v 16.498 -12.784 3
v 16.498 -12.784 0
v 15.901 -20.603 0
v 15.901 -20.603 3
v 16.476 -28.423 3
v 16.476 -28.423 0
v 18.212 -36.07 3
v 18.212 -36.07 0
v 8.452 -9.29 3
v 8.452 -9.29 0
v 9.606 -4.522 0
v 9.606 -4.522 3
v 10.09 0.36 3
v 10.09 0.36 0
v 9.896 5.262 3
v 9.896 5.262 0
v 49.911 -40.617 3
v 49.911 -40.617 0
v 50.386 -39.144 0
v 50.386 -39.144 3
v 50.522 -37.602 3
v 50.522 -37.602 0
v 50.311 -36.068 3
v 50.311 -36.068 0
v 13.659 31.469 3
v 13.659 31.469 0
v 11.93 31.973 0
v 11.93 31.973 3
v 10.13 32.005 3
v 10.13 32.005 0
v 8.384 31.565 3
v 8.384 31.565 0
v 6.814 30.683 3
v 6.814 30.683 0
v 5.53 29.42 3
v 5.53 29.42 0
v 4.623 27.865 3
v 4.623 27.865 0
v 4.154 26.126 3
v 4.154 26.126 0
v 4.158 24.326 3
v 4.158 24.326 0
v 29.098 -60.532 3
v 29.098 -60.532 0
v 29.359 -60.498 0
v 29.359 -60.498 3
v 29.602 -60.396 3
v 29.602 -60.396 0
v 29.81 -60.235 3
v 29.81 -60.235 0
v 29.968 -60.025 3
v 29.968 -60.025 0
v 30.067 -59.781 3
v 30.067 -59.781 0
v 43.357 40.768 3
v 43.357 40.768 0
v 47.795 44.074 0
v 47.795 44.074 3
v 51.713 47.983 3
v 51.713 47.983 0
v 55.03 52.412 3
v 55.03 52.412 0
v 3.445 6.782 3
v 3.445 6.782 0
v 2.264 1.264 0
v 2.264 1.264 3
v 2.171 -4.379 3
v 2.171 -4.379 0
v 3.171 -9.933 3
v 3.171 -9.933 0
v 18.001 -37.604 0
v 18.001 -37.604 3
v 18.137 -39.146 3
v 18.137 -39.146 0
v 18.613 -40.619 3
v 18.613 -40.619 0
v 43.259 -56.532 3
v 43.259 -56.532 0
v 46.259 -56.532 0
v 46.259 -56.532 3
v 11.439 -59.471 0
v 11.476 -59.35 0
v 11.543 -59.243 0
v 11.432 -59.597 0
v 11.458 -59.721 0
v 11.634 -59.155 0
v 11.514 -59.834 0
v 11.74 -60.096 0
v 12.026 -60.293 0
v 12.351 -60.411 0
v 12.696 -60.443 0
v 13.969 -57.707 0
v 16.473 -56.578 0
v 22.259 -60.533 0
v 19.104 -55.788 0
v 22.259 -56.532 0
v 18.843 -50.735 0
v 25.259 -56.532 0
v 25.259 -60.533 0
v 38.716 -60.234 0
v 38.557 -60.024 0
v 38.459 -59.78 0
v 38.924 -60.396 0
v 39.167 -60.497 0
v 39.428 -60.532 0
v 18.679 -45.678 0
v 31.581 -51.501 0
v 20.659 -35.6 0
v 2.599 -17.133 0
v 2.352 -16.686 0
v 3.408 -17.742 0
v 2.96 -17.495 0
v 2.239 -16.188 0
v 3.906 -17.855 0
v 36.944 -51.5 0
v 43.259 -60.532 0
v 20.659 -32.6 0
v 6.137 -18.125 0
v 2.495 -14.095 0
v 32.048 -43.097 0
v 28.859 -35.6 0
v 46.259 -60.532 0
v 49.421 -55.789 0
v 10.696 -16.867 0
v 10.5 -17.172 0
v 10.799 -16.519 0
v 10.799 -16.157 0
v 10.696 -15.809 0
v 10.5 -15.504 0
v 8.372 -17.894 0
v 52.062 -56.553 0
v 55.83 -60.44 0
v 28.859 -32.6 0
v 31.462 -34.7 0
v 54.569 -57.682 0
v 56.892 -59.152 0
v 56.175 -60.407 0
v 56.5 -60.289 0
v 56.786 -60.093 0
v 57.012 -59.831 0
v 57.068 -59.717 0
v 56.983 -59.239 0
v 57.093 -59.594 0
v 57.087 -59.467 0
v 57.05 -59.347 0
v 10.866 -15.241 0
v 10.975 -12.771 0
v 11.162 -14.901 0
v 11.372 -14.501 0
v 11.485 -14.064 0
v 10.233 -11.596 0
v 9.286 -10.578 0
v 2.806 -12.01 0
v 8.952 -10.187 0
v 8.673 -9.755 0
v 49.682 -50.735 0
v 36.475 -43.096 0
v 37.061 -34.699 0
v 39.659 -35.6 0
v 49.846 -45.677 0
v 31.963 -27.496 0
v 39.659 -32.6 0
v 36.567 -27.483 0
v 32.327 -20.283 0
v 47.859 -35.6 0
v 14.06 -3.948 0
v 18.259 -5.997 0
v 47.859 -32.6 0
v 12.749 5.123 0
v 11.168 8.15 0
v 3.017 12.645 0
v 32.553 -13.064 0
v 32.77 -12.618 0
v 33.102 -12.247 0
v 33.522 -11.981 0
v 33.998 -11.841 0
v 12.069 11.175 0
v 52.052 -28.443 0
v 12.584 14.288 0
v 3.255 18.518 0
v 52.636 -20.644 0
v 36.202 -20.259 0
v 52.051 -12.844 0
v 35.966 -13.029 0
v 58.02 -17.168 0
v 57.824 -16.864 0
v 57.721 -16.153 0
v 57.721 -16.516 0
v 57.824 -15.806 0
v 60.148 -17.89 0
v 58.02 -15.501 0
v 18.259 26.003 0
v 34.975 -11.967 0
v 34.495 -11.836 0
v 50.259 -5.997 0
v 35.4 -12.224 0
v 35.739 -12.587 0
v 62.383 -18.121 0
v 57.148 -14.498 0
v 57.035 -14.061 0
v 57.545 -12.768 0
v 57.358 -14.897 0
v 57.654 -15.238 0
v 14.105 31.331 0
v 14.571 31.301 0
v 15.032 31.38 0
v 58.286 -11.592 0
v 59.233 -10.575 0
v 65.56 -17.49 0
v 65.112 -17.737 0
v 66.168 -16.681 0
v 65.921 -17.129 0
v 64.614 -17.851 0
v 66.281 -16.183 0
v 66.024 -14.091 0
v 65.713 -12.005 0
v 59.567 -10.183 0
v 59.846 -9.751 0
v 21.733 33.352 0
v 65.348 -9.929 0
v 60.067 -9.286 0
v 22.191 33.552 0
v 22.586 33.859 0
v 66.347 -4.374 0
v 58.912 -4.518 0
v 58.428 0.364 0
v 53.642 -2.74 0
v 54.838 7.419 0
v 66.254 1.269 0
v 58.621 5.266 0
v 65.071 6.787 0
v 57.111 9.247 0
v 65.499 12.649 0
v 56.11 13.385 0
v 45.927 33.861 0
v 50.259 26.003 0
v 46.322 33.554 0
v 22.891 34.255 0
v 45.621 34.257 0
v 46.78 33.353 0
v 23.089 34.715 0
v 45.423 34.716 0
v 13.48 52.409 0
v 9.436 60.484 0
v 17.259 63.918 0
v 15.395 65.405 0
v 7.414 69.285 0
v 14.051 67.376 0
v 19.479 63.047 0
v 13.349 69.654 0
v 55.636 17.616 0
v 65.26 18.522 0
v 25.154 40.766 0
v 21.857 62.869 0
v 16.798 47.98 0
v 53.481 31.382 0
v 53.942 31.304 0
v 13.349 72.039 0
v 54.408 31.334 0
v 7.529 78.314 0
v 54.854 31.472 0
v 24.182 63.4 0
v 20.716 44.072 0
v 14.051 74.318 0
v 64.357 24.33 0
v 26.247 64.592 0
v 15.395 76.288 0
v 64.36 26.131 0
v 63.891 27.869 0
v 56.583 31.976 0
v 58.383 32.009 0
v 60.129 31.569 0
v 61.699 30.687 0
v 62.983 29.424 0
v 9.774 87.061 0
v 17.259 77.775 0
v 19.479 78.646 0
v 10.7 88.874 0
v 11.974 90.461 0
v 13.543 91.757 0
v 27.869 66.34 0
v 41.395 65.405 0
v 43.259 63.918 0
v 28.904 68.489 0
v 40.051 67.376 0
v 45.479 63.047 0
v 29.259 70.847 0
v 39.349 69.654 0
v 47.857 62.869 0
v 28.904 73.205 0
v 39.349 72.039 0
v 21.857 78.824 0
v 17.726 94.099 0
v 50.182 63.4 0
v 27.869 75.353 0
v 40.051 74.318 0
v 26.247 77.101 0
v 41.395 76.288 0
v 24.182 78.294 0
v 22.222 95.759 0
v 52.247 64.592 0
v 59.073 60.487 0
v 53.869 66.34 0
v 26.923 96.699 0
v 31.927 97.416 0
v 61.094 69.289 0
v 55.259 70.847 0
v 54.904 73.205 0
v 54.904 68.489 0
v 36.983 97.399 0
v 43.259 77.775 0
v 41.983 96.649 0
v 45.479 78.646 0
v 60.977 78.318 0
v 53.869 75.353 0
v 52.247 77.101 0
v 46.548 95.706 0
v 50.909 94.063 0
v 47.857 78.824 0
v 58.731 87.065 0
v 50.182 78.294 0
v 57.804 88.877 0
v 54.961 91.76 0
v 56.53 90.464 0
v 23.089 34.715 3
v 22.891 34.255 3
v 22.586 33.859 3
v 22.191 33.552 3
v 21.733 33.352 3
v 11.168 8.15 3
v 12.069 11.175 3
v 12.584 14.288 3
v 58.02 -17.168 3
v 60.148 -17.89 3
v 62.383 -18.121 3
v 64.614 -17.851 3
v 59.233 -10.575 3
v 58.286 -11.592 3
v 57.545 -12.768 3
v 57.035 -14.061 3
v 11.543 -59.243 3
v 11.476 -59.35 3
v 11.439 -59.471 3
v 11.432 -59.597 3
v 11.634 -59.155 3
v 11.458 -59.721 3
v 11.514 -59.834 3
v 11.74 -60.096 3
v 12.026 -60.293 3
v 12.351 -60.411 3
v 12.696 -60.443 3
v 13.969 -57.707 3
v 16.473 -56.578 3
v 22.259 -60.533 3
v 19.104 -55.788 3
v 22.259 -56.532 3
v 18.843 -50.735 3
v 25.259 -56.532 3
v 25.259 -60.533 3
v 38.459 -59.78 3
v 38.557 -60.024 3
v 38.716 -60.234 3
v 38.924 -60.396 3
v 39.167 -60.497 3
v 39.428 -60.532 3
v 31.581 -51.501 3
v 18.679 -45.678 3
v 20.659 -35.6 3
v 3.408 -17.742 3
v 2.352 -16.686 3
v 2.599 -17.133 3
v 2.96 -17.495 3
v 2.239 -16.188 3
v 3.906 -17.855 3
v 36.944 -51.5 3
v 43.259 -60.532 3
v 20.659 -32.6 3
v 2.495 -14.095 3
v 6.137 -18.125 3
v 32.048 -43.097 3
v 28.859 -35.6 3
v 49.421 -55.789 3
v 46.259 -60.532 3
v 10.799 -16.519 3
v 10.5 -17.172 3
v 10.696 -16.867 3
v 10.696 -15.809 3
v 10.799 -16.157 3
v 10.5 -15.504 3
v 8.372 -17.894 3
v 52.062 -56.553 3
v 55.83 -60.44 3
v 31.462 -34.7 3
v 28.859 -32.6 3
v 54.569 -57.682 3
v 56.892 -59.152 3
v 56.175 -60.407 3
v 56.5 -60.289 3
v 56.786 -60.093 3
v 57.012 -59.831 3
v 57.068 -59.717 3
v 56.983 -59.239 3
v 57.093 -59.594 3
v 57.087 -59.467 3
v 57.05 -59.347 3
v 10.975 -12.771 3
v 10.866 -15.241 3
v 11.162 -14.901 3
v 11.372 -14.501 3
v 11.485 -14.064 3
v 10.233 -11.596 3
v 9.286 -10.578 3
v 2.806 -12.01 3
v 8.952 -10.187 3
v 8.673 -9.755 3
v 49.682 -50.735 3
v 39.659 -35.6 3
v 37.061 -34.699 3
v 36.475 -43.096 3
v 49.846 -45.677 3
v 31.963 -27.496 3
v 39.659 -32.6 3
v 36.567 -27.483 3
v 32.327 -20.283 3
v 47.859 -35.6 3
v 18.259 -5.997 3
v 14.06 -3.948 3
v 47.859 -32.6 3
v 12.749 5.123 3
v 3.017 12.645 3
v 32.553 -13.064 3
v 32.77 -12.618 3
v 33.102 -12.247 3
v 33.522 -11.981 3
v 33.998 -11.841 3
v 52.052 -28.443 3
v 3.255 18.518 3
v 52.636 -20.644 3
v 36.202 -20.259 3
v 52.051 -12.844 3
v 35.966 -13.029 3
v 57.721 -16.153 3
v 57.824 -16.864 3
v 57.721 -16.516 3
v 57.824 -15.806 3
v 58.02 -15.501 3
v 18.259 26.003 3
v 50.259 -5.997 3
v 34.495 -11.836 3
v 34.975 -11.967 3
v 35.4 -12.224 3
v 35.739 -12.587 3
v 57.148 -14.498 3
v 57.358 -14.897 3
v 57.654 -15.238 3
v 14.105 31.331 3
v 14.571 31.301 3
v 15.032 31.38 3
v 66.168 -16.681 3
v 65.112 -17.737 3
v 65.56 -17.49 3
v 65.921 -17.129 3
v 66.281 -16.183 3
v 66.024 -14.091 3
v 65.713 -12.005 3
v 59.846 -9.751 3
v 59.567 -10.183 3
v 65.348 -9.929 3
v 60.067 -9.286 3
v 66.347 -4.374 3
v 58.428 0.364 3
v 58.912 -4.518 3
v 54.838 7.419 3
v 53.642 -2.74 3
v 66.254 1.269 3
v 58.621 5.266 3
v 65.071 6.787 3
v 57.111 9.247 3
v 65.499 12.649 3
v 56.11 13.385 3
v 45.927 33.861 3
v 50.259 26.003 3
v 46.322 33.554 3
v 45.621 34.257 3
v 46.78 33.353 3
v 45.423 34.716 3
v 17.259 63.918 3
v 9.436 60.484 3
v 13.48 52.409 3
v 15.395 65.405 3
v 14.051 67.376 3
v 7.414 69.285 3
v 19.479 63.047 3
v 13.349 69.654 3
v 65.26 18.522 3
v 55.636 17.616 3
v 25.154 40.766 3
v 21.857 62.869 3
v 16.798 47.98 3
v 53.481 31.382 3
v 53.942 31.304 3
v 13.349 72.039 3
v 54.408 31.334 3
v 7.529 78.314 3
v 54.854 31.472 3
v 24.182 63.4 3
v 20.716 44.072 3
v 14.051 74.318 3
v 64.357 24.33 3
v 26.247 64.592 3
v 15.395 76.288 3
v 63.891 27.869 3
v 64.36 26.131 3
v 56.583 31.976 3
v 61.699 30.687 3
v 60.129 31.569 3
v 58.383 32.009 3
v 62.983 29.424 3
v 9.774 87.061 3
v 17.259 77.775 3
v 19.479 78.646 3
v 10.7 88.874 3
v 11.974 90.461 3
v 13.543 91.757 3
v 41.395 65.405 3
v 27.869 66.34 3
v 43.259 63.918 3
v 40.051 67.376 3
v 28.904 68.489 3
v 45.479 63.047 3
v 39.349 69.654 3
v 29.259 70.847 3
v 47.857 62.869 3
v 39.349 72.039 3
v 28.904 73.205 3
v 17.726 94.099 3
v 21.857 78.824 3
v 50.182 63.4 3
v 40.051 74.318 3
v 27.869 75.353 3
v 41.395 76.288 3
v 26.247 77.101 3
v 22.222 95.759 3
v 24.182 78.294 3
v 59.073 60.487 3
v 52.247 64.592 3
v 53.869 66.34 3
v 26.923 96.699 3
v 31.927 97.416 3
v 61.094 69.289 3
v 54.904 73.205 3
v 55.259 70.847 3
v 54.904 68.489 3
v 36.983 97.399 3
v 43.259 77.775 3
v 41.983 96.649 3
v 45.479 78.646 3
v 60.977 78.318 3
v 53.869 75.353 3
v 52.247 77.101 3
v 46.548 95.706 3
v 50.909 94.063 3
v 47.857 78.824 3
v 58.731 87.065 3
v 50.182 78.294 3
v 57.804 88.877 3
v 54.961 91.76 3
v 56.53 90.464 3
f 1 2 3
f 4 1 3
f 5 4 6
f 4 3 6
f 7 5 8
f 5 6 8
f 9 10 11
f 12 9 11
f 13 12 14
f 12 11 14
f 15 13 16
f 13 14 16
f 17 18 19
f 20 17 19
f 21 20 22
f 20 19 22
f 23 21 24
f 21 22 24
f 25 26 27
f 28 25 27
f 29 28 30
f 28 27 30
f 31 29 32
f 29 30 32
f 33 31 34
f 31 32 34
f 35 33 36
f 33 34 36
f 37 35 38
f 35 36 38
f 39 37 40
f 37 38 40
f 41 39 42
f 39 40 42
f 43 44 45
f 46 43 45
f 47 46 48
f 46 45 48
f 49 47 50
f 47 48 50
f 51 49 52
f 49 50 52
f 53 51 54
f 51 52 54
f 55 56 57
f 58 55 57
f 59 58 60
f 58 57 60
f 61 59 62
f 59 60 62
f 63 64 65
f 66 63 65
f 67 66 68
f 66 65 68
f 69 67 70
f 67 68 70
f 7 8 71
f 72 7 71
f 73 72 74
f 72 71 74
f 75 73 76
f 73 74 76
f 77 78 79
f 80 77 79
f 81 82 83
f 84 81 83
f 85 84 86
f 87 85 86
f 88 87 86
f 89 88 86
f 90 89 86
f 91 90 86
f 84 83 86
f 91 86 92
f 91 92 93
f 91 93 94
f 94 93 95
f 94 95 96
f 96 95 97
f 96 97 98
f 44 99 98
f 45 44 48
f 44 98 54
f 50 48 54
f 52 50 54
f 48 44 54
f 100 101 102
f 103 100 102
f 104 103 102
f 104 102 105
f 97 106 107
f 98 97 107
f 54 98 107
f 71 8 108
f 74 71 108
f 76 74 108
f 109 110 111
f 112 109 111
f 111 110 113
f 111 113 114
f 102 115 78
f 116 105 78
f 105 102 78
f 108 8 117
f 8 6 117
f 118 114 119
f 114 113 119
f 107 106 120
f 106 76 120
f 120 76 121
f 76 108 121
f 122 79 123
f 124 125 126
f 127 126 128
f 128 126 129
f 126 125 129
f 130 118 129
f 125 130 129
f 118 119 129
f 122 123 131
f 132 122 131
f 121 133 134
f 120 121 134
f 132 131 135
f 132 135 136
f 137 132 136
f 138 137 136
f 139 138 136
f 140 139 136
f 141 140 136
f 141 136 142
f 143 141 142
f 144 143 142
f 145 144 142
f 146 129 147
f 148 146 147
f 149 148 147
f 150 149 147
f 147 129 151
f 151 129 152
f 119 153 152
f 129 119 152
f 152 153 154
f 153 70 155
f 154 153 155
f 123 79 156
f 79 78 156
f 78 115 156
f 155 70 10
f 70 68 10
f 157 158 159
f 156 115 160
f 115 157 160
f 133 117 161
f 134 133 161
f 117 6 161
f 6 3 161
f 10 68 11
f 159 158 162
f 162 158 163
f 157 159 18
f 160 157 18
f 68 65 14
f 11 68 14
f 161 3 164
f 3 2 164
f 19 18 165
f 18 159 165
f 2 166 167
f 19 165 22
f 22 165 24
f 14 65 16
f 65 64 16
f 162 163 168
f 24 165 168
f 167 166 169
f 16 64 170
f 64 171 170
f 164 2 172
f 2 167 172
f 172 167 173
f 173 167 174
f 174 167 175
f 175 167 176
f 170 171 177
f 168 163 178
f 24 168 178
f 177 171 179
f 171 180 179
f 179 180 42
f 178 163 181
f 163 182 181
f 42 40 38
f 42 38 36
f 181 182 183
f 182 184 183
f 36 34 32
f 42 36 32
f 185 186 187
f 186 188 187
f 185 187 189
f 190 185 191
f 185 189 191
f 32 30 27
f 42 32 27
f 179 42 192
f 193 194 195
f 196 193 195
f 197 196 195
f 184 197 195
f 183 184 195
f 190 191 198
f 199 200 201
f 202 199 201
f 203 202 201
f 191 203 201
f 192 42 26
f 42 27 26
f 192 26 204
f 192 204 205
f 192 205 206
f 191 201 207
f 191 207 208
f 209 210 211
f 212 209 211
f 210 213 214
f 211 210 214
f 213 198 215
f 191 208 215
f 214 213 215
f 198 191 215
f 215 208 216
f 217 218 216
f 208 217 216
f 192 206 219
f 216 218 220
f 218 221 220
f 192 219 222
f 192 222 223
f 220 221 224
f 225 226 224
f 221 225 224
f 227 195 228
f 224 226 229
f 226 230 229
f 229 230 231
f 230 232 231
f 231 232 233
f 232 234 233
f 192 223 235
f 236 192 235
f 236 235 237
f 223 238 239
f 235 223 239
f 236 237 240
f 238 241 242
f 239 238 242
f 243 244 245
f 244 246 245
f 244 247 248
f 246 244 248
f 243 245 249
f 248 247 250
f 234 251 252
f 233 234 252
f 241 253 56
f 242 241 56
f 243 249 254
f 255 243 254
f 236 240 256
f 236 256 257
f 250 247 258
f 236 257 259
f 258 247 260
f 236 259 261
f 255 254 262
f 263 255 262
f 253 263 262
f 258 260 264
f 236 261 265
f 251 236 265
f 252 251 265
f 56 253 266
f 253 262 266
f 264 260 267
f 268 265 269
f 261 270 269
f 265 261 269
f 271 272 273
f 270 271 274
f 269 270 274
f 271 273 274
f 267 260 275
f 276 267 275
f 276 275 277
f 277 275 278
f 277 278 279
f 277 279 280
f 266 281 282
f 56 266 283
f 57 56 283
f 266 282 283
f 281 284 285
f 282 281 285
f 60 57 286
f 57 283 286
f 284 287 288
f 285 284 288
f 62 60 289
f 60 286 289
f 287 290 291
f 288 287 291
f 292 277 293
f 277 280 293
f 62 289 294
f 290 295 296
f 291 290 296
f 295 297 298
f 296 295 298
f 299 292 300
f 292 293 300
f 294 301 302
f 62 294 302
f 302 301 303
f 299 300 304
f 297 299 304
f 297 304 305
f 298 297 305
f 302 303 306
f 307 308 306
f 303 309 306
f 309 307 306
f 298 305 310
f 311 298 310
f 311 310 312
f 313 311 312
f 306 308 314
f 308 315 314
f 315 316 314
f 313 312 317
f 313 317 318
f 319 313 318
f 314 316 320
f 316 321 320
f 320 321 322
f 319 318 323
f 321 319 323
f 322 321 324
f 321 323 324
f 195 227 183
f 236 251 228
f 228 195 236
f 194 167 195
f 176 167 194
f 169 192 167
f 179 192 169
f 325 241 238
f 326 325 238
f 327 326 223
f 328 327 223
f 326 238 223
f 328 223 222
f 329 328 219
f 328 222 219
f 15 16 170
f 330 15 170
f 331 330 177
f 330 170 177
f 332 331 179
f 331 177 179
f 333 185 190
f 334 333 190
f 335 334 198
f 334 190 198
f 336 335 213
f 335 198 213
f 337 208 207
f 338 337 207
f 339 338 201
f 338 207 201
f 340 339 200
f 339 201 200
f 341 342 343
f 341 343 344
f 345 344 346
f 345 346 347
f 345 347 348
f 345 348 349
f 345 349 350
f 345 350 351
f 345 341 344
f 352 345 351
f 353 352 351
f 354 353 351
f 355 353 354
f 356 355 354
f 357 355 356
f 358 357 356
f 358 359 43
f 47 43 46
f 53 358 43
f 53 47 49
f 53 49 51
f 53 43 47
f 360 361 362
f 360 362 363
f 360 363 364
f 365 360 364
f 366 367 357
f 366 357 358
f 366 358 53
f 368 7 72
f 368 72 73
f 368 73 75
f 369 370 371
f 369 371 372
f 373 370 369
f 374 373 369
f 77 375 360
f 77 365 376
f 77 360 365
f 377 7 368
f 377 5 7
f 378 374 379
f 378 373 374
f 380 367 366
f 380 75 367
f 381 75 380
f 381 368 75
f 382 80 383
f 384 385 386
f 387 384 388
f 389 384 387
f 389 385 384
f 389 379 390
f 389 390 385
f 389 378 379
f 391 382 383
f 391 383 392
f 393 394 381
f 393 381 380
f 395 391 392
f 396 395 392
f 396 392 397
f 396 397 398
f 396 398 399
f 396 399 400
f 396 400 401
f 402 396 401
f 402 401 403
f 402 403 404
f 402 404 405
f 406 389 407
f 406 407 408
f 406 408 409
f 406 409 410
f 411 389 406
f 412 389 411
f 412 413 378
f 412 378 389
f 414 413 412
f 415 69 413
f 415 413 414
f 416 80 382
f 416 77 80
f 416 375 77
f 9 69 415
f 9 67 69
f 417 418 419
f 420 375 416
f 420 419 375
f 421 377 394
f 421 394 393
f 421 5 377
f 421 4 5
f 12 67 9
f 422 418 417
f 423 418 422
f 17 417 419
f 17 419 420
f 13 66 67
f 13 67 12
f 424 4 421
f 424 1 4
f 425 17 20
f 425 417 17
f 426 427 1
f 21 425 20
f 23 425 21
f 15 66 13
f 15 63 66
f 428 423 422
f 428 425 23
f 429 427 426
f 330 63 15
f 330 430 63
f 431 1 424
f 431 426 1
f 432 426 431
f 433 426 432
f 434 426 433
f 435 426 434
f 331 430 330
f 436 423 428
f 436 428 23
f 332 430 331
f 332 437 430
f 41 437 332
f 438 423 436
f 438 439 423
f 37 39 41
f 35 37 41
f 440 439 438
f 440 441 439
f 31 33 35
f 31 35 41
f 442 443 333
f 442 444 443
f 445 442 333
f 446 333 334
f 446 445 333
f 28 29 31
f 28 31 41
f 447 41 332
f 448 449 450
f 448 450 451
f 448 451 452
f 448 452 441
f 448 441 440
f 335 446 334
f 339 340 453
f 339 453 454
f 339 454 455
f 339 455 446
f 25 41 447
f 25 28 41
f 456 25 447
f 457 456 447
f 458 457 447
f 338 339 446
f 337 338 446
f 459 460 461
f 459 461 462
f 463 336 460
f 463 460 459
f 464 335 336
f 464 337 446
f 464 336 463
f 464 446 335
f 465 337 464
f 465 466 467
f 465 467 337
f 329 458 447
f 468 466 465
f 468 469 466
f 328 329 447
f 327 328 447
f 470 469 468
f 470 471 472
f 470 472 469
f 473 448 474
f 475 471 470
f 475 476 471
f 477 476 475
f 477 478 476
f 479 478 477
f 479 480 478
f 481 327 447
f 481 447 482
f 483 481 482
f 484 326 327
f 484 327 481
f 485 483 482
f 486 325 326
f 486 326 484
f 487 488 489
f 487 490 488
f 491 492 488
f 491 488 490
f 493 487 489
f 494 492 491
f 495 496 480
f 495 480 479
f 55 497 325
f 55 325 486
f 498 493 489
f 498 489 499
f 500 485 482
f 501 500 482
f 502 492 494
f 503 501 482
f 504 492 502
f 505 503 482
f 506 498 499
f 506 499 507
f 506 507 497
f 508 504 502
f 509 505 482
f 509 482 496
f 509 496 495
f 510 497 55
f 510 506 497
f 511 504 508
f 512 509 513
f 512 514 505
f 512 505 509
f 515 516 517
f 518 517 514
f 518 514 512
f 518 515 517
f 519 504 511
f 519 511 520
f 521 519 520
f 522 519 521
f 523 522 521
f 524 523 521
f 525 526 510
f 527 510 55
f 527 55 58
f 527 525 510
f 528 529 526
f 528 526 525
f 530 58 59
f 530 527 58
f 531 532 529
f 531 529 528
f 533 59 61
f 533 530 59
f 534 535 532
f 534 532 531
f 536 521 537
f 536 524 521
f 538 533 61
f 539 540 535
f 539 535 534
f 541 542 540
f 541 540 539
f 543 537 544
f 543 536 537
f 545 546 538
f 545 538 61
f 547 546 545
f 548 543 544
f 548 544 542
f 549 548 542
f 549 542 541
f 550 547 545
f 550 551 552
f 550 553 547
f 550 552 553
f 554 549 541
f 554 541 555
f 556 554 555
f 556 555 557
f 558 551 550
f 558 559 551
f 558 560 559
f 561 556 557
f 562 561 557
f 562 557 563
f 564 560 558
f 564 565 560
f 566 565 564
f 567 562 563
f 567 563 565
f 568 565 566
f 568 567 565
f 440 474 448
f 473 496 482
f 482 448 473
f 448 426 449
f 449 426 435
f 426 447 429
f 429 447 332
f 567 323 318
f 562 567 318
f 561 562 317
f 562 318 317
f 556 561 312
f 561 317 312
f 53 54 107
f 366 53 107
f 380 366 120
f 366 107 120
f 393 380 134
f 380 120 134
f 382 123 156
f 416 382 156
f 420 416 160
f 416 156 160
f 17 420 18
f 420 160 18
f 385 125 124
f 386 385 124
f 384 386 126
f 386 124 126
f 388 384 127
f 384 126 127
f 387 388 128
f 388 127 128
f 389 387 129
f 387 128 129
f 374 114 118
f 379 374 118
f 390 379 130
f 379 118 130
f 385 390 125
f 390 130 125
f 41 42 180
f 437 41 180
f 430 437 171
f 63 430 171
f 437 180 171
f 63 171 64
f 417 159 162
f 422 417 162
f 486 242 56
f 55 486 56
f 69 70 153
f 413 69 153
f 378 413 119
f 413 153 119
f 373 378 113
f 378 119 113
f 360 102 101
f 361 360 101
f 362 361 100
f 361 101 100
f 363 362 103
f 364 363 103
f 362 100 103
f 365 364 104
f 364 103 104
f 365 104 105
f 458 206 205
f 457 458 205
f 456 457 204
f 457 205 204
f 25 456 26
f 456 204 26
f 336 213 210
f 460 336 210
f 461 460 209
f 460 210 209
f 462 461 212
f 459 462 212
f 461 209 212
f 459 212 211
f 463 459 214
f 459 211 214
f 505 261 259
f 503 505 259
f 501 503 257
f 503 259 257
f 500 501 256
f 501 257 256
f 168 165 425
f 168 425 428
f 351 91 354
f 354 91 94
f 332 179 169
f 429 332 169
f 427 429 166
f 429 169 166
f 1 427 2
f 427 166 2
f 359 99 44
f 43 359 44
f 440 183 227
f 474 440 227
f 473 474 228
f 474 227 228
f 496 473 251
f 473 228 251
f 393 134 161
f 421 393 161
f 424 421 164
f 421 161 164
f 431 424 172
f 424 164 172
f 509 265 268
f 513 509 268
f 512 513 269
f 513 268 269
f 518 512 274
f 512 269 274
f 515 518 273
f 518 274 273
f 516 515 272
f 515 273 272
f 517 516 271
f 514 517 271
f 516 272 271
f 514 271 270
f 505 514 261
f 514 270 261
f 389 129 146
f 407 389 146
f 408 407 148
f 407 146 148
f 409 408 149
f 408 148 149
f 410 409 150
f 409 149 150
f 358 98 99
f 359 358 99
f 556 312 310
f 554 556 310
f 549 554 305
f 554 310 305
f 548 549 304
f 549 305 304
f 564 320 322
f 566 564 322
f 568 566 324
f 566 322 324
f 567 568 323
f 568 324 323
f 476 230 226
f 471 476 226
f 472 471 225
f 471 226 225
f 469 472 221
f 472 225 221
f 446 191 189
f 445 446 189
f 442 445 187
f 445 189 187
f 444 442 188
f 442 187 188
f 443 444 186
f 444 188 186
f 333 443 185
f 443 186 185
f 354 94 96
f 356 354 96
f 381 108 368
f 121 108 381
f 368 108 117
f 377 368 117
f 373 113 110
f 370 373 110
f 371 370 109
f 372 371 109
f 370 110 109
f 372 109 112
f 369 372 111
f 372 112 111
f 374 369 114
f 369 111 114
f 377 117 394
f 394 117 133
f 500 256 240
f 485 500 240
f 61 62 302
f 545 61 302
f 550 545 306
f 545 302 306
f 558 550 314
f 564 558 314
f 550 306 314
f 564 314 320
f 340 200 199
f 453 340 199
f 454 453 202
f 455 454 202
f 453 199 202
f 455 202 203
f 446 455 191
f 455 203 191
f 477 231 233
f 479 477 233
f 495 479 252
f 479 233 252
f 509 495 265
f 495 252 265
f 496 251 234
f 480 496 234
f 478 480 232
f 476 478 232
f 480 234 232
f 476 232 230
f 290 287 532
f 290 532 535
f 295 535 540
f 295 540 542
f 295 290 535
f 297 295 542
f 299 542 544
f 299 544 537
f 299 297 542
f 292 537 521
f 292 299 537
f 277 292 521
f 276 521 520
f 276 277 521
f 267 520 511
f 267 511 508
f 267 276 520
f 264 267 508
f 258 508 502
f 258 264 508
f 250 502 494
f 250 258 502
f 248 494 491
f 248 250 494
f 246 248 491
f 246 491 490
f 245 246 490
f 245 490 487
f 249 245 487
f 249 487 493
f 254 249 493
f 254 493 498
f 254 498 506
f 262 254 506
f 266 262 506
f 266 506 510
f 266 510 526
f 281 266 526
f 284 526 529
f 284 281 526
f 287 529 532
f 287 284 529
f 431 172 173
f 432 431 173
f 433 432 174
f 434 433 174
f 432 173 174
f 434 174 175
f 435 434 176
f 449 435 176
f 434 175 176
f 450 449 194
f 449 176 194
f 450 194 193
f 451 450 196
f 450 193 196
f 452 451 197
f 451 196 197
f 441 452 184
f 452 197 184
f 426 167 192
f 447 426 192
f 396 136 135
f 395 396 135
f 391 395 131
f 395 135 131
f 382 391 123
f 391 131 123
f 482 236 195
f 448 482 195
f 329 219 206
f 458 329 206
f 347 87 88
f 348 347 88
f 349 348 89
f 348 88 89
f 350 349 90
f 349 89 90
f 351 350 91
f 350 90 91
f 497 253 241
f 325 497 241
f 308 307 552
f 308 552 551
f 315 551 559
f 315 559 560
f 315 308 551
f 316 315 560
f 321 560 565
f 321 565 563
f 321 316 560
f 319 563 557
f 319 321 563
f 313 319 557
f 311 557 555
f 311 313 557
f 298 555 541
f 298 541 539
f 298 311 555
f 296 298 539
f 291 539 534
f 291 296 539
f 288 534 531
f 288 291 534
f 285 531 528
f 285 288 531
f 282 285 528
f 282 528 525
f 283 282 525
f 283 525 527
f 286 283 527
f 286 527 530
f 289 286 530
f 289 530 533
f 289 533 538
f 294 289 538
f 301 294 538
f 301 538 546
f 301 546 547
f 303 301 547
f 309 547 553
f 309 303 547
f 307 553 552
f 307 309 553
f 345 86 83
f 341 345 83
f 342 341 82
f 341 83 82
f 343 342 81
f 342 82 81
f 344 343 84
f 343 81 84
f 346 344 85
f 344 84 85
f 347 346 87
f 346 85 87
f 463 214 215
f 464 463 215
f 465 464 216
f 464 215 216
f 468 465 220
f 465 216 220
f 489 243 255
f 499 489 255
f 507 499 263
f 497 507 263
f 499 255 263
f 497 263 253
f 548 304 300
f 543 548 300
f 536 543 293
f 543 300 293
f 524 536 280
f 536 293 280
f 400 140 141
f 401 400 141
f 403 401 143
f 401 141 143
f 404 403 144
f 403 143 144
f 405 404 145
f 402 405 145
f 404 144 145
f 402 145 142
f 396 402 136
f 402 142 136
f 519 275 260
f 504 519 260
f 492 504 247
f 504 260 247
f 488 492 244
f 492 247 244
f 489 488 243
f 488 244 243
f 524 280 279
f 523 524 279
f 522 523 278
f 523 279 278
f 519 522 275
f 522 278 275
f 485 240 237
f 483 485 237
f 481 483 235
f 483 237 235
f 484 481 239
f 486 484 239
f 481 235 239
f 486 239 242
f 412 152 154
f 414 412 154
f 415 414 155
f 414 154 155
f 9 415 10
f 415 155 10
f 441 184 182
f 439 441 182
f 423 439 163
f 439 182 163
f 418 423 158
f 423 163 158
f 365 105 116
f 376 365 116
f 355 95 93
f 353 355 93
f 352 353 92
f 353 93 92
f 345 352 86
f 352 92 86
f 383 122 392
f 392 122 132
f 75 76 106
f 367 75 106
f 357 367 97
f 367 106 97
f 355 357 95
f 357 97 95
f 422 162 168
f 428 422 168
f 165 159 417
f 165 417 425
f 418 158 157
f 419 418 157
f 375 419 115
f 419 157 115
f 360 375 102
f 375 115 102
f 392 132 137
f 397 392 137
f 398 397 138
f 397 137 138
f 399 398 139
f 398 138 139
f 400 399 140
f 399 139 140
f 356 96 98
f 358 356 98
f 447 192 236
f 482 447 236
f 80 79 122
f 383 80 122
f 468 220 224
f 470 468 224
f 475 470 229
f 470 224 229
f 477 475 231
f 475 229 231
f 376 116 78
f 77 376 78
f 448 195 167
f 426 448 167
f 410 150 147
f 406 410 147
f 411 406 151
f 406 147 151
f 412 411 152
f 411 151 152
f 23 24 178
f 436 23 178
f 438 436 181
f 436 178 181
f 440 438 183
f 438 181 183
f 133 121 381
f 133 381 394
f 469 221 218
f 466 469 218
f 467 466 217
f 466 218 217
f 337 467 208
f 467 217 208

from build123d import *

# Parameters (mm, degrees)
MODEL_R                 = 8
MODEL_W                 = 8.2
MODEL_H                 = 3
SALIENTE_EXTRUIR1_DEPTH = 3


with BuildPart() as part:
    # Model → Saliente-Extruir1 (new body)
    with BuildSketch(Plane.XY):
        with BuildLine():
            Line((53.481445034, 31.38247243), (46.779993349, 33.353487631))
            ThreePointArc((46.779993349, 33.353487631), (45.927013388, 33.861110925), (45.423137443, 34.716309882))
            Line((45.423137443, 34.716309882), (43.357228049, 40.767605918))
            ThreePointArc((43.357228049, 40.767605918), (49.8242529, 45.957956881), (55.030233707, 52.412406306))
            ThreePointArc((55.030233707, 52.412406306), (61.093598066, 69.288732485), (58.730938319, 87.064913502))
            ThreePointArc((58.730938319, 87.064913502), (57.207808393, 89.703172008), (54.961022773, 91.760424326))
            ThreePointArc((54.961022773, 91.760424326), (48.760554591, 94.970135555), (41.983416035, 96.648958014))
            ThreePointArc((41.983416035, 96.648958014), (34.455707931, 97.499868783), (26.92255254, 96.698614587))
            ThreePointArc((26.92255254, 96.698614587), (19.94147438, 95.017139449), (13.543281779, 91.757393696))
            ThreePointArc((13.543281779, 91.757393696), (11.296797252, 89.699812596), (9.774053436, 87.061331216))
            ThreePointArc((9.774053436, 87.061331216), (7.413995161, 69.284804627), (13.479829214, 52.409365969))
            ThreePointArc((13.479829214, 52.409365969), (18.686734846, 45.955698119), (25.154492019, 40.766303923))
            Line((25.154492019, 40.766303923), (23.089449249, 34.714697754))
            ThreePointArc((23.089449249, 34.714697754), (22.585696773, 33.859426062), (21.732790104, 33.351679631))
            Line((21.732790104, 33.351679631), (15.03162304, 31.379696979))
            ThreePointArc((15.03162304, 31.379696979), (14.337279285, 31.302558661), (13.658765154, 31.468938177))
            ThreePointArc((13.658765154, 31.468938177), (6.813868189, 30.682998994), (4.157550352, 24.325775512))
            ThreePointArc((4.157550352, 24.325775512), (3.052384752, 15.584544005), (3.445376772, 6.78249444))
            ThreePointArc((3.445376772, 6.78249444), (2.079974129, -1.555345588), (3.171410736, -9.933451987))
            ThreePointArc((3.171410736, -9.933451987), (2.64421566, -13.051552622), (2.238579914, -16.187783777))
            ThreePointArc((2.238579914, -16.187783777), (2.76704769, -17.326785827), (3.90620228, -17.854924712))
            ThreePointArc((3.90620228, -17.854924712), (7.260899106, -18.072090773), (10.49984033, -17.171862116))
            ThreePointArc((10.49984033, -17.171862116), (10.811965124, -16.338126213), (10.499599615, -15.504480466))
            ThreePointArc((10.499599615, -15.504480466), (11.162118239, -14.900674558), (11.484662699, -14.0643268))
            ThreePointArc((11.484662699, -14.0643268), (10.631367301, -12.166232415), (9.28624721, -10.578300657))
            ThreePointArc((9.28624721, -10.578300657), (8.805524833, -9.975430237), (8.452370377, -9.289989739))
            ThreePointArc((8.452370377, -9.289989739), (9.932418252, -2.08907189), (9.895592327, 5.262281961))
            ThreePointArc((9.895592327, 5.262281961), (11.66577443, 9.648300332), (12.584225099, 14.288036336))
            ThreePointArc((12.584225099, 14.288036336), (13.262246612, 0.566960759), (16.497509918, -12.784469858))
            ThreePointArc((16.497509918, -12.784469858), (16.042177417, -24.524016518), (18.211841217, -36.070307803))
            ThreePointArc((18.211841217, -36.070307803), (18.02570309, -38.378850147), (18.612581504, -40.61929405))
            ThreePointArc((18.612581504, -40.61929405), (18.748290938, -48.20736643), (19.104485347, -55.78828887))
            ThreePointArc((19.104485347, -55.78828887), (15.202287094, -57.1012499), (11.634214393, -59.155483354))
            ThreePointArc((11.634214393, -59.155483354), (11.43855886, -59.470730285), (11.514005122, -59.834006456))
            ThreePointArc((11.514005122, -59.834006456), (12.025516155, -60.292514594), (12.695797103, -60.442836581))
            Line((12.695797103, -60.442836581), (22.259216422, -60.533409729))
            Line((22.259216422, -60.533409729), (22.259232154, -56.531748667))
            Line((22.259232154, -56.531748667), (25.259232154, -56.531748667))
            Line((25.259232154, -56.531748667), (25.259232342, -60.533048512))
            Line((25.259232342, -60.533048512), (29.098103748, -60.532494304))
            ThreePointArc((29.098103748, -60.532494304), (29.711184017, -60.322402882), (30.066706369, -59.780545262))
            ThreePointArc((30.066706369, -59.780545262), (31.946344773, -47.306061086), (31.46168815, -34.700074258))
            ThreePointArc((31.46168815, -34.700074258), (32.162582874, -23.89009615), (32.552547443, -13.064441077))
            ThreePointArc((32.552547443, -13.064441077), (34.246727454, -11.820907742), (35.966107002, -13.029359245))
            ThreePointArc((35.966107002, -13.029359245), (36.368868995, -23.871724918), (37.060905712, -34.699476107))
            ThreePointArc((37.060905712, -34.699476107), (36.577860738, -47.305611007), (38.45911007, -59.779939467))
            ThreePointArc((38.45911007, -59.779939467), (38.814710645, -60.321745755), (39.427821238, -60.531748667))
            Line((39.427821238, -60.531748667), (43.259232154, -60.531748667))
            Line((43.259232154, -60.531748667), (43.259232154, -56.531748667))
            Line((43.259232154, -56.531748667), (46.259232154, -56.531748667))
            Line((46.259232154, -56.531748667), (46.259232154, -60.531748667))
            Line((46.259232154, -60.531748667), (55.830114769, -60.439722986))
            ThreePointArc((55.830114769, -60.439722986), (56.500374008, -60.289304234), (57.011818842, -59.830722256))
            ThreePointArc((57.011818842, -59.830722256), (57.087212657, -59.467435196), (56.891511615, -59.152216515))
            ThreePointArc((56.891511615, -59.152216515), (53.335182459, -57.072918402), (49.420928579, -55.788560868))
            ThreePointArc((49.420928579, -55.788560868), (49.776142638, -48.206407611), (49.910836364, -40.617133427))
            ThreePointArc((49.910836364, -40.617133427), (50.497421978, -38.376559304), (50.310964473, -36.06799077))
            ThreePointArc((50.310964473, -36.06799077), (52.490190754, -24.554218645), (52.051420468, -12.844246127))
            ThreePointArc((52.051420468, -12.844246127), (54.289526358, 2.333645055), (55.635574328, 17.616499945))
            ThreePointArc((55.635574328, 17.616499945), (56.545662292, 11.300275423), (58.621246197, 5.265799159))
            ThreePointArc((58.621246197, 5.265799159), (58.585481568, -2.085559931), (60.066569006, -9.286264035))
            ThreePointArc((60.066569006, -9.286264035), (59.713513509, -9.97175551), (59.232878172, -10.574695324))
            ThreePointArc((59.232878172, -10.574695324), (57.88798734, -12.162821257), (57.034965974, -14.06103881))
            ThreePointArc((57.034965974, -14.06103881), (57.357631173, -14.897339994), (58.020236959, -15.50105025))
            ThreePointArc((58.020236959, -15.50105025), (57.707991805, -16.334741084), (58.020236959, -17.168431917))
            ThreePointArc((58.020236959, -17.168431917), (61.259308114, -18.068192968), (64.613973553, -17.850542599))
            ThreePointArc((64.613973553, -17.850542599), (65.753051885, -17.322239264), (66.28135522, -16.183160932))
            ThreePointArc((66.28135522, -16.183160932), (65.875266709, -13.04698837), (65.347621487, -9.928963878))
            ThreePointArc((65.347621487, -9.928963878), (66.437848557, -1.550699998), (65.071242216, 6.786942824))
            ThreePointArc((65.071242216, 6.786942824), (65.462963502, 15.589049032), (64.356535965, 24.330120898))
            ThreePointArc((64.356535965, 24.330120898), (61.699300379, 30.686960828), (54.854290022, 31.471911822))
            ThreePointArc((54.854290022, 31.471911822), (54.175799918, 31.305434353), (53.481445034, 31.38247243))
        make_face()
        with Locations((21.259232154, 70.846618638)):
            Circle(MODEL_R, mode=Mode.SUBTRACT)
        with Locations((47.259232154, 70.846618638)):
            Circle(MODEL_R, mode=Mode.SUBTRACT)
        Polygon((34.759232154, 26.002609393), (50.259232154, 26.002609393), (50.259232154, -5.997390607), (18.259232154, -5.997390607), (18.259232154, 26.002609393), (33.759232154, 26.002609393), align=None, mode=Mode.SUBTRACT)
        with Locations((24.759438839, -34.100057584)):
            Rectangle(MODEL_W, MODEL_H, mode=Mode.SUBTRACT)
        with Locations((43.759438839, -34.100057584)):
            Rectangle(MODEL_W, MODEL_H, mode=Mode.SUBTRACT)
    extrude(amount=SALIENTE_EXTRUIR1_DEPTH)


solid = part.part
